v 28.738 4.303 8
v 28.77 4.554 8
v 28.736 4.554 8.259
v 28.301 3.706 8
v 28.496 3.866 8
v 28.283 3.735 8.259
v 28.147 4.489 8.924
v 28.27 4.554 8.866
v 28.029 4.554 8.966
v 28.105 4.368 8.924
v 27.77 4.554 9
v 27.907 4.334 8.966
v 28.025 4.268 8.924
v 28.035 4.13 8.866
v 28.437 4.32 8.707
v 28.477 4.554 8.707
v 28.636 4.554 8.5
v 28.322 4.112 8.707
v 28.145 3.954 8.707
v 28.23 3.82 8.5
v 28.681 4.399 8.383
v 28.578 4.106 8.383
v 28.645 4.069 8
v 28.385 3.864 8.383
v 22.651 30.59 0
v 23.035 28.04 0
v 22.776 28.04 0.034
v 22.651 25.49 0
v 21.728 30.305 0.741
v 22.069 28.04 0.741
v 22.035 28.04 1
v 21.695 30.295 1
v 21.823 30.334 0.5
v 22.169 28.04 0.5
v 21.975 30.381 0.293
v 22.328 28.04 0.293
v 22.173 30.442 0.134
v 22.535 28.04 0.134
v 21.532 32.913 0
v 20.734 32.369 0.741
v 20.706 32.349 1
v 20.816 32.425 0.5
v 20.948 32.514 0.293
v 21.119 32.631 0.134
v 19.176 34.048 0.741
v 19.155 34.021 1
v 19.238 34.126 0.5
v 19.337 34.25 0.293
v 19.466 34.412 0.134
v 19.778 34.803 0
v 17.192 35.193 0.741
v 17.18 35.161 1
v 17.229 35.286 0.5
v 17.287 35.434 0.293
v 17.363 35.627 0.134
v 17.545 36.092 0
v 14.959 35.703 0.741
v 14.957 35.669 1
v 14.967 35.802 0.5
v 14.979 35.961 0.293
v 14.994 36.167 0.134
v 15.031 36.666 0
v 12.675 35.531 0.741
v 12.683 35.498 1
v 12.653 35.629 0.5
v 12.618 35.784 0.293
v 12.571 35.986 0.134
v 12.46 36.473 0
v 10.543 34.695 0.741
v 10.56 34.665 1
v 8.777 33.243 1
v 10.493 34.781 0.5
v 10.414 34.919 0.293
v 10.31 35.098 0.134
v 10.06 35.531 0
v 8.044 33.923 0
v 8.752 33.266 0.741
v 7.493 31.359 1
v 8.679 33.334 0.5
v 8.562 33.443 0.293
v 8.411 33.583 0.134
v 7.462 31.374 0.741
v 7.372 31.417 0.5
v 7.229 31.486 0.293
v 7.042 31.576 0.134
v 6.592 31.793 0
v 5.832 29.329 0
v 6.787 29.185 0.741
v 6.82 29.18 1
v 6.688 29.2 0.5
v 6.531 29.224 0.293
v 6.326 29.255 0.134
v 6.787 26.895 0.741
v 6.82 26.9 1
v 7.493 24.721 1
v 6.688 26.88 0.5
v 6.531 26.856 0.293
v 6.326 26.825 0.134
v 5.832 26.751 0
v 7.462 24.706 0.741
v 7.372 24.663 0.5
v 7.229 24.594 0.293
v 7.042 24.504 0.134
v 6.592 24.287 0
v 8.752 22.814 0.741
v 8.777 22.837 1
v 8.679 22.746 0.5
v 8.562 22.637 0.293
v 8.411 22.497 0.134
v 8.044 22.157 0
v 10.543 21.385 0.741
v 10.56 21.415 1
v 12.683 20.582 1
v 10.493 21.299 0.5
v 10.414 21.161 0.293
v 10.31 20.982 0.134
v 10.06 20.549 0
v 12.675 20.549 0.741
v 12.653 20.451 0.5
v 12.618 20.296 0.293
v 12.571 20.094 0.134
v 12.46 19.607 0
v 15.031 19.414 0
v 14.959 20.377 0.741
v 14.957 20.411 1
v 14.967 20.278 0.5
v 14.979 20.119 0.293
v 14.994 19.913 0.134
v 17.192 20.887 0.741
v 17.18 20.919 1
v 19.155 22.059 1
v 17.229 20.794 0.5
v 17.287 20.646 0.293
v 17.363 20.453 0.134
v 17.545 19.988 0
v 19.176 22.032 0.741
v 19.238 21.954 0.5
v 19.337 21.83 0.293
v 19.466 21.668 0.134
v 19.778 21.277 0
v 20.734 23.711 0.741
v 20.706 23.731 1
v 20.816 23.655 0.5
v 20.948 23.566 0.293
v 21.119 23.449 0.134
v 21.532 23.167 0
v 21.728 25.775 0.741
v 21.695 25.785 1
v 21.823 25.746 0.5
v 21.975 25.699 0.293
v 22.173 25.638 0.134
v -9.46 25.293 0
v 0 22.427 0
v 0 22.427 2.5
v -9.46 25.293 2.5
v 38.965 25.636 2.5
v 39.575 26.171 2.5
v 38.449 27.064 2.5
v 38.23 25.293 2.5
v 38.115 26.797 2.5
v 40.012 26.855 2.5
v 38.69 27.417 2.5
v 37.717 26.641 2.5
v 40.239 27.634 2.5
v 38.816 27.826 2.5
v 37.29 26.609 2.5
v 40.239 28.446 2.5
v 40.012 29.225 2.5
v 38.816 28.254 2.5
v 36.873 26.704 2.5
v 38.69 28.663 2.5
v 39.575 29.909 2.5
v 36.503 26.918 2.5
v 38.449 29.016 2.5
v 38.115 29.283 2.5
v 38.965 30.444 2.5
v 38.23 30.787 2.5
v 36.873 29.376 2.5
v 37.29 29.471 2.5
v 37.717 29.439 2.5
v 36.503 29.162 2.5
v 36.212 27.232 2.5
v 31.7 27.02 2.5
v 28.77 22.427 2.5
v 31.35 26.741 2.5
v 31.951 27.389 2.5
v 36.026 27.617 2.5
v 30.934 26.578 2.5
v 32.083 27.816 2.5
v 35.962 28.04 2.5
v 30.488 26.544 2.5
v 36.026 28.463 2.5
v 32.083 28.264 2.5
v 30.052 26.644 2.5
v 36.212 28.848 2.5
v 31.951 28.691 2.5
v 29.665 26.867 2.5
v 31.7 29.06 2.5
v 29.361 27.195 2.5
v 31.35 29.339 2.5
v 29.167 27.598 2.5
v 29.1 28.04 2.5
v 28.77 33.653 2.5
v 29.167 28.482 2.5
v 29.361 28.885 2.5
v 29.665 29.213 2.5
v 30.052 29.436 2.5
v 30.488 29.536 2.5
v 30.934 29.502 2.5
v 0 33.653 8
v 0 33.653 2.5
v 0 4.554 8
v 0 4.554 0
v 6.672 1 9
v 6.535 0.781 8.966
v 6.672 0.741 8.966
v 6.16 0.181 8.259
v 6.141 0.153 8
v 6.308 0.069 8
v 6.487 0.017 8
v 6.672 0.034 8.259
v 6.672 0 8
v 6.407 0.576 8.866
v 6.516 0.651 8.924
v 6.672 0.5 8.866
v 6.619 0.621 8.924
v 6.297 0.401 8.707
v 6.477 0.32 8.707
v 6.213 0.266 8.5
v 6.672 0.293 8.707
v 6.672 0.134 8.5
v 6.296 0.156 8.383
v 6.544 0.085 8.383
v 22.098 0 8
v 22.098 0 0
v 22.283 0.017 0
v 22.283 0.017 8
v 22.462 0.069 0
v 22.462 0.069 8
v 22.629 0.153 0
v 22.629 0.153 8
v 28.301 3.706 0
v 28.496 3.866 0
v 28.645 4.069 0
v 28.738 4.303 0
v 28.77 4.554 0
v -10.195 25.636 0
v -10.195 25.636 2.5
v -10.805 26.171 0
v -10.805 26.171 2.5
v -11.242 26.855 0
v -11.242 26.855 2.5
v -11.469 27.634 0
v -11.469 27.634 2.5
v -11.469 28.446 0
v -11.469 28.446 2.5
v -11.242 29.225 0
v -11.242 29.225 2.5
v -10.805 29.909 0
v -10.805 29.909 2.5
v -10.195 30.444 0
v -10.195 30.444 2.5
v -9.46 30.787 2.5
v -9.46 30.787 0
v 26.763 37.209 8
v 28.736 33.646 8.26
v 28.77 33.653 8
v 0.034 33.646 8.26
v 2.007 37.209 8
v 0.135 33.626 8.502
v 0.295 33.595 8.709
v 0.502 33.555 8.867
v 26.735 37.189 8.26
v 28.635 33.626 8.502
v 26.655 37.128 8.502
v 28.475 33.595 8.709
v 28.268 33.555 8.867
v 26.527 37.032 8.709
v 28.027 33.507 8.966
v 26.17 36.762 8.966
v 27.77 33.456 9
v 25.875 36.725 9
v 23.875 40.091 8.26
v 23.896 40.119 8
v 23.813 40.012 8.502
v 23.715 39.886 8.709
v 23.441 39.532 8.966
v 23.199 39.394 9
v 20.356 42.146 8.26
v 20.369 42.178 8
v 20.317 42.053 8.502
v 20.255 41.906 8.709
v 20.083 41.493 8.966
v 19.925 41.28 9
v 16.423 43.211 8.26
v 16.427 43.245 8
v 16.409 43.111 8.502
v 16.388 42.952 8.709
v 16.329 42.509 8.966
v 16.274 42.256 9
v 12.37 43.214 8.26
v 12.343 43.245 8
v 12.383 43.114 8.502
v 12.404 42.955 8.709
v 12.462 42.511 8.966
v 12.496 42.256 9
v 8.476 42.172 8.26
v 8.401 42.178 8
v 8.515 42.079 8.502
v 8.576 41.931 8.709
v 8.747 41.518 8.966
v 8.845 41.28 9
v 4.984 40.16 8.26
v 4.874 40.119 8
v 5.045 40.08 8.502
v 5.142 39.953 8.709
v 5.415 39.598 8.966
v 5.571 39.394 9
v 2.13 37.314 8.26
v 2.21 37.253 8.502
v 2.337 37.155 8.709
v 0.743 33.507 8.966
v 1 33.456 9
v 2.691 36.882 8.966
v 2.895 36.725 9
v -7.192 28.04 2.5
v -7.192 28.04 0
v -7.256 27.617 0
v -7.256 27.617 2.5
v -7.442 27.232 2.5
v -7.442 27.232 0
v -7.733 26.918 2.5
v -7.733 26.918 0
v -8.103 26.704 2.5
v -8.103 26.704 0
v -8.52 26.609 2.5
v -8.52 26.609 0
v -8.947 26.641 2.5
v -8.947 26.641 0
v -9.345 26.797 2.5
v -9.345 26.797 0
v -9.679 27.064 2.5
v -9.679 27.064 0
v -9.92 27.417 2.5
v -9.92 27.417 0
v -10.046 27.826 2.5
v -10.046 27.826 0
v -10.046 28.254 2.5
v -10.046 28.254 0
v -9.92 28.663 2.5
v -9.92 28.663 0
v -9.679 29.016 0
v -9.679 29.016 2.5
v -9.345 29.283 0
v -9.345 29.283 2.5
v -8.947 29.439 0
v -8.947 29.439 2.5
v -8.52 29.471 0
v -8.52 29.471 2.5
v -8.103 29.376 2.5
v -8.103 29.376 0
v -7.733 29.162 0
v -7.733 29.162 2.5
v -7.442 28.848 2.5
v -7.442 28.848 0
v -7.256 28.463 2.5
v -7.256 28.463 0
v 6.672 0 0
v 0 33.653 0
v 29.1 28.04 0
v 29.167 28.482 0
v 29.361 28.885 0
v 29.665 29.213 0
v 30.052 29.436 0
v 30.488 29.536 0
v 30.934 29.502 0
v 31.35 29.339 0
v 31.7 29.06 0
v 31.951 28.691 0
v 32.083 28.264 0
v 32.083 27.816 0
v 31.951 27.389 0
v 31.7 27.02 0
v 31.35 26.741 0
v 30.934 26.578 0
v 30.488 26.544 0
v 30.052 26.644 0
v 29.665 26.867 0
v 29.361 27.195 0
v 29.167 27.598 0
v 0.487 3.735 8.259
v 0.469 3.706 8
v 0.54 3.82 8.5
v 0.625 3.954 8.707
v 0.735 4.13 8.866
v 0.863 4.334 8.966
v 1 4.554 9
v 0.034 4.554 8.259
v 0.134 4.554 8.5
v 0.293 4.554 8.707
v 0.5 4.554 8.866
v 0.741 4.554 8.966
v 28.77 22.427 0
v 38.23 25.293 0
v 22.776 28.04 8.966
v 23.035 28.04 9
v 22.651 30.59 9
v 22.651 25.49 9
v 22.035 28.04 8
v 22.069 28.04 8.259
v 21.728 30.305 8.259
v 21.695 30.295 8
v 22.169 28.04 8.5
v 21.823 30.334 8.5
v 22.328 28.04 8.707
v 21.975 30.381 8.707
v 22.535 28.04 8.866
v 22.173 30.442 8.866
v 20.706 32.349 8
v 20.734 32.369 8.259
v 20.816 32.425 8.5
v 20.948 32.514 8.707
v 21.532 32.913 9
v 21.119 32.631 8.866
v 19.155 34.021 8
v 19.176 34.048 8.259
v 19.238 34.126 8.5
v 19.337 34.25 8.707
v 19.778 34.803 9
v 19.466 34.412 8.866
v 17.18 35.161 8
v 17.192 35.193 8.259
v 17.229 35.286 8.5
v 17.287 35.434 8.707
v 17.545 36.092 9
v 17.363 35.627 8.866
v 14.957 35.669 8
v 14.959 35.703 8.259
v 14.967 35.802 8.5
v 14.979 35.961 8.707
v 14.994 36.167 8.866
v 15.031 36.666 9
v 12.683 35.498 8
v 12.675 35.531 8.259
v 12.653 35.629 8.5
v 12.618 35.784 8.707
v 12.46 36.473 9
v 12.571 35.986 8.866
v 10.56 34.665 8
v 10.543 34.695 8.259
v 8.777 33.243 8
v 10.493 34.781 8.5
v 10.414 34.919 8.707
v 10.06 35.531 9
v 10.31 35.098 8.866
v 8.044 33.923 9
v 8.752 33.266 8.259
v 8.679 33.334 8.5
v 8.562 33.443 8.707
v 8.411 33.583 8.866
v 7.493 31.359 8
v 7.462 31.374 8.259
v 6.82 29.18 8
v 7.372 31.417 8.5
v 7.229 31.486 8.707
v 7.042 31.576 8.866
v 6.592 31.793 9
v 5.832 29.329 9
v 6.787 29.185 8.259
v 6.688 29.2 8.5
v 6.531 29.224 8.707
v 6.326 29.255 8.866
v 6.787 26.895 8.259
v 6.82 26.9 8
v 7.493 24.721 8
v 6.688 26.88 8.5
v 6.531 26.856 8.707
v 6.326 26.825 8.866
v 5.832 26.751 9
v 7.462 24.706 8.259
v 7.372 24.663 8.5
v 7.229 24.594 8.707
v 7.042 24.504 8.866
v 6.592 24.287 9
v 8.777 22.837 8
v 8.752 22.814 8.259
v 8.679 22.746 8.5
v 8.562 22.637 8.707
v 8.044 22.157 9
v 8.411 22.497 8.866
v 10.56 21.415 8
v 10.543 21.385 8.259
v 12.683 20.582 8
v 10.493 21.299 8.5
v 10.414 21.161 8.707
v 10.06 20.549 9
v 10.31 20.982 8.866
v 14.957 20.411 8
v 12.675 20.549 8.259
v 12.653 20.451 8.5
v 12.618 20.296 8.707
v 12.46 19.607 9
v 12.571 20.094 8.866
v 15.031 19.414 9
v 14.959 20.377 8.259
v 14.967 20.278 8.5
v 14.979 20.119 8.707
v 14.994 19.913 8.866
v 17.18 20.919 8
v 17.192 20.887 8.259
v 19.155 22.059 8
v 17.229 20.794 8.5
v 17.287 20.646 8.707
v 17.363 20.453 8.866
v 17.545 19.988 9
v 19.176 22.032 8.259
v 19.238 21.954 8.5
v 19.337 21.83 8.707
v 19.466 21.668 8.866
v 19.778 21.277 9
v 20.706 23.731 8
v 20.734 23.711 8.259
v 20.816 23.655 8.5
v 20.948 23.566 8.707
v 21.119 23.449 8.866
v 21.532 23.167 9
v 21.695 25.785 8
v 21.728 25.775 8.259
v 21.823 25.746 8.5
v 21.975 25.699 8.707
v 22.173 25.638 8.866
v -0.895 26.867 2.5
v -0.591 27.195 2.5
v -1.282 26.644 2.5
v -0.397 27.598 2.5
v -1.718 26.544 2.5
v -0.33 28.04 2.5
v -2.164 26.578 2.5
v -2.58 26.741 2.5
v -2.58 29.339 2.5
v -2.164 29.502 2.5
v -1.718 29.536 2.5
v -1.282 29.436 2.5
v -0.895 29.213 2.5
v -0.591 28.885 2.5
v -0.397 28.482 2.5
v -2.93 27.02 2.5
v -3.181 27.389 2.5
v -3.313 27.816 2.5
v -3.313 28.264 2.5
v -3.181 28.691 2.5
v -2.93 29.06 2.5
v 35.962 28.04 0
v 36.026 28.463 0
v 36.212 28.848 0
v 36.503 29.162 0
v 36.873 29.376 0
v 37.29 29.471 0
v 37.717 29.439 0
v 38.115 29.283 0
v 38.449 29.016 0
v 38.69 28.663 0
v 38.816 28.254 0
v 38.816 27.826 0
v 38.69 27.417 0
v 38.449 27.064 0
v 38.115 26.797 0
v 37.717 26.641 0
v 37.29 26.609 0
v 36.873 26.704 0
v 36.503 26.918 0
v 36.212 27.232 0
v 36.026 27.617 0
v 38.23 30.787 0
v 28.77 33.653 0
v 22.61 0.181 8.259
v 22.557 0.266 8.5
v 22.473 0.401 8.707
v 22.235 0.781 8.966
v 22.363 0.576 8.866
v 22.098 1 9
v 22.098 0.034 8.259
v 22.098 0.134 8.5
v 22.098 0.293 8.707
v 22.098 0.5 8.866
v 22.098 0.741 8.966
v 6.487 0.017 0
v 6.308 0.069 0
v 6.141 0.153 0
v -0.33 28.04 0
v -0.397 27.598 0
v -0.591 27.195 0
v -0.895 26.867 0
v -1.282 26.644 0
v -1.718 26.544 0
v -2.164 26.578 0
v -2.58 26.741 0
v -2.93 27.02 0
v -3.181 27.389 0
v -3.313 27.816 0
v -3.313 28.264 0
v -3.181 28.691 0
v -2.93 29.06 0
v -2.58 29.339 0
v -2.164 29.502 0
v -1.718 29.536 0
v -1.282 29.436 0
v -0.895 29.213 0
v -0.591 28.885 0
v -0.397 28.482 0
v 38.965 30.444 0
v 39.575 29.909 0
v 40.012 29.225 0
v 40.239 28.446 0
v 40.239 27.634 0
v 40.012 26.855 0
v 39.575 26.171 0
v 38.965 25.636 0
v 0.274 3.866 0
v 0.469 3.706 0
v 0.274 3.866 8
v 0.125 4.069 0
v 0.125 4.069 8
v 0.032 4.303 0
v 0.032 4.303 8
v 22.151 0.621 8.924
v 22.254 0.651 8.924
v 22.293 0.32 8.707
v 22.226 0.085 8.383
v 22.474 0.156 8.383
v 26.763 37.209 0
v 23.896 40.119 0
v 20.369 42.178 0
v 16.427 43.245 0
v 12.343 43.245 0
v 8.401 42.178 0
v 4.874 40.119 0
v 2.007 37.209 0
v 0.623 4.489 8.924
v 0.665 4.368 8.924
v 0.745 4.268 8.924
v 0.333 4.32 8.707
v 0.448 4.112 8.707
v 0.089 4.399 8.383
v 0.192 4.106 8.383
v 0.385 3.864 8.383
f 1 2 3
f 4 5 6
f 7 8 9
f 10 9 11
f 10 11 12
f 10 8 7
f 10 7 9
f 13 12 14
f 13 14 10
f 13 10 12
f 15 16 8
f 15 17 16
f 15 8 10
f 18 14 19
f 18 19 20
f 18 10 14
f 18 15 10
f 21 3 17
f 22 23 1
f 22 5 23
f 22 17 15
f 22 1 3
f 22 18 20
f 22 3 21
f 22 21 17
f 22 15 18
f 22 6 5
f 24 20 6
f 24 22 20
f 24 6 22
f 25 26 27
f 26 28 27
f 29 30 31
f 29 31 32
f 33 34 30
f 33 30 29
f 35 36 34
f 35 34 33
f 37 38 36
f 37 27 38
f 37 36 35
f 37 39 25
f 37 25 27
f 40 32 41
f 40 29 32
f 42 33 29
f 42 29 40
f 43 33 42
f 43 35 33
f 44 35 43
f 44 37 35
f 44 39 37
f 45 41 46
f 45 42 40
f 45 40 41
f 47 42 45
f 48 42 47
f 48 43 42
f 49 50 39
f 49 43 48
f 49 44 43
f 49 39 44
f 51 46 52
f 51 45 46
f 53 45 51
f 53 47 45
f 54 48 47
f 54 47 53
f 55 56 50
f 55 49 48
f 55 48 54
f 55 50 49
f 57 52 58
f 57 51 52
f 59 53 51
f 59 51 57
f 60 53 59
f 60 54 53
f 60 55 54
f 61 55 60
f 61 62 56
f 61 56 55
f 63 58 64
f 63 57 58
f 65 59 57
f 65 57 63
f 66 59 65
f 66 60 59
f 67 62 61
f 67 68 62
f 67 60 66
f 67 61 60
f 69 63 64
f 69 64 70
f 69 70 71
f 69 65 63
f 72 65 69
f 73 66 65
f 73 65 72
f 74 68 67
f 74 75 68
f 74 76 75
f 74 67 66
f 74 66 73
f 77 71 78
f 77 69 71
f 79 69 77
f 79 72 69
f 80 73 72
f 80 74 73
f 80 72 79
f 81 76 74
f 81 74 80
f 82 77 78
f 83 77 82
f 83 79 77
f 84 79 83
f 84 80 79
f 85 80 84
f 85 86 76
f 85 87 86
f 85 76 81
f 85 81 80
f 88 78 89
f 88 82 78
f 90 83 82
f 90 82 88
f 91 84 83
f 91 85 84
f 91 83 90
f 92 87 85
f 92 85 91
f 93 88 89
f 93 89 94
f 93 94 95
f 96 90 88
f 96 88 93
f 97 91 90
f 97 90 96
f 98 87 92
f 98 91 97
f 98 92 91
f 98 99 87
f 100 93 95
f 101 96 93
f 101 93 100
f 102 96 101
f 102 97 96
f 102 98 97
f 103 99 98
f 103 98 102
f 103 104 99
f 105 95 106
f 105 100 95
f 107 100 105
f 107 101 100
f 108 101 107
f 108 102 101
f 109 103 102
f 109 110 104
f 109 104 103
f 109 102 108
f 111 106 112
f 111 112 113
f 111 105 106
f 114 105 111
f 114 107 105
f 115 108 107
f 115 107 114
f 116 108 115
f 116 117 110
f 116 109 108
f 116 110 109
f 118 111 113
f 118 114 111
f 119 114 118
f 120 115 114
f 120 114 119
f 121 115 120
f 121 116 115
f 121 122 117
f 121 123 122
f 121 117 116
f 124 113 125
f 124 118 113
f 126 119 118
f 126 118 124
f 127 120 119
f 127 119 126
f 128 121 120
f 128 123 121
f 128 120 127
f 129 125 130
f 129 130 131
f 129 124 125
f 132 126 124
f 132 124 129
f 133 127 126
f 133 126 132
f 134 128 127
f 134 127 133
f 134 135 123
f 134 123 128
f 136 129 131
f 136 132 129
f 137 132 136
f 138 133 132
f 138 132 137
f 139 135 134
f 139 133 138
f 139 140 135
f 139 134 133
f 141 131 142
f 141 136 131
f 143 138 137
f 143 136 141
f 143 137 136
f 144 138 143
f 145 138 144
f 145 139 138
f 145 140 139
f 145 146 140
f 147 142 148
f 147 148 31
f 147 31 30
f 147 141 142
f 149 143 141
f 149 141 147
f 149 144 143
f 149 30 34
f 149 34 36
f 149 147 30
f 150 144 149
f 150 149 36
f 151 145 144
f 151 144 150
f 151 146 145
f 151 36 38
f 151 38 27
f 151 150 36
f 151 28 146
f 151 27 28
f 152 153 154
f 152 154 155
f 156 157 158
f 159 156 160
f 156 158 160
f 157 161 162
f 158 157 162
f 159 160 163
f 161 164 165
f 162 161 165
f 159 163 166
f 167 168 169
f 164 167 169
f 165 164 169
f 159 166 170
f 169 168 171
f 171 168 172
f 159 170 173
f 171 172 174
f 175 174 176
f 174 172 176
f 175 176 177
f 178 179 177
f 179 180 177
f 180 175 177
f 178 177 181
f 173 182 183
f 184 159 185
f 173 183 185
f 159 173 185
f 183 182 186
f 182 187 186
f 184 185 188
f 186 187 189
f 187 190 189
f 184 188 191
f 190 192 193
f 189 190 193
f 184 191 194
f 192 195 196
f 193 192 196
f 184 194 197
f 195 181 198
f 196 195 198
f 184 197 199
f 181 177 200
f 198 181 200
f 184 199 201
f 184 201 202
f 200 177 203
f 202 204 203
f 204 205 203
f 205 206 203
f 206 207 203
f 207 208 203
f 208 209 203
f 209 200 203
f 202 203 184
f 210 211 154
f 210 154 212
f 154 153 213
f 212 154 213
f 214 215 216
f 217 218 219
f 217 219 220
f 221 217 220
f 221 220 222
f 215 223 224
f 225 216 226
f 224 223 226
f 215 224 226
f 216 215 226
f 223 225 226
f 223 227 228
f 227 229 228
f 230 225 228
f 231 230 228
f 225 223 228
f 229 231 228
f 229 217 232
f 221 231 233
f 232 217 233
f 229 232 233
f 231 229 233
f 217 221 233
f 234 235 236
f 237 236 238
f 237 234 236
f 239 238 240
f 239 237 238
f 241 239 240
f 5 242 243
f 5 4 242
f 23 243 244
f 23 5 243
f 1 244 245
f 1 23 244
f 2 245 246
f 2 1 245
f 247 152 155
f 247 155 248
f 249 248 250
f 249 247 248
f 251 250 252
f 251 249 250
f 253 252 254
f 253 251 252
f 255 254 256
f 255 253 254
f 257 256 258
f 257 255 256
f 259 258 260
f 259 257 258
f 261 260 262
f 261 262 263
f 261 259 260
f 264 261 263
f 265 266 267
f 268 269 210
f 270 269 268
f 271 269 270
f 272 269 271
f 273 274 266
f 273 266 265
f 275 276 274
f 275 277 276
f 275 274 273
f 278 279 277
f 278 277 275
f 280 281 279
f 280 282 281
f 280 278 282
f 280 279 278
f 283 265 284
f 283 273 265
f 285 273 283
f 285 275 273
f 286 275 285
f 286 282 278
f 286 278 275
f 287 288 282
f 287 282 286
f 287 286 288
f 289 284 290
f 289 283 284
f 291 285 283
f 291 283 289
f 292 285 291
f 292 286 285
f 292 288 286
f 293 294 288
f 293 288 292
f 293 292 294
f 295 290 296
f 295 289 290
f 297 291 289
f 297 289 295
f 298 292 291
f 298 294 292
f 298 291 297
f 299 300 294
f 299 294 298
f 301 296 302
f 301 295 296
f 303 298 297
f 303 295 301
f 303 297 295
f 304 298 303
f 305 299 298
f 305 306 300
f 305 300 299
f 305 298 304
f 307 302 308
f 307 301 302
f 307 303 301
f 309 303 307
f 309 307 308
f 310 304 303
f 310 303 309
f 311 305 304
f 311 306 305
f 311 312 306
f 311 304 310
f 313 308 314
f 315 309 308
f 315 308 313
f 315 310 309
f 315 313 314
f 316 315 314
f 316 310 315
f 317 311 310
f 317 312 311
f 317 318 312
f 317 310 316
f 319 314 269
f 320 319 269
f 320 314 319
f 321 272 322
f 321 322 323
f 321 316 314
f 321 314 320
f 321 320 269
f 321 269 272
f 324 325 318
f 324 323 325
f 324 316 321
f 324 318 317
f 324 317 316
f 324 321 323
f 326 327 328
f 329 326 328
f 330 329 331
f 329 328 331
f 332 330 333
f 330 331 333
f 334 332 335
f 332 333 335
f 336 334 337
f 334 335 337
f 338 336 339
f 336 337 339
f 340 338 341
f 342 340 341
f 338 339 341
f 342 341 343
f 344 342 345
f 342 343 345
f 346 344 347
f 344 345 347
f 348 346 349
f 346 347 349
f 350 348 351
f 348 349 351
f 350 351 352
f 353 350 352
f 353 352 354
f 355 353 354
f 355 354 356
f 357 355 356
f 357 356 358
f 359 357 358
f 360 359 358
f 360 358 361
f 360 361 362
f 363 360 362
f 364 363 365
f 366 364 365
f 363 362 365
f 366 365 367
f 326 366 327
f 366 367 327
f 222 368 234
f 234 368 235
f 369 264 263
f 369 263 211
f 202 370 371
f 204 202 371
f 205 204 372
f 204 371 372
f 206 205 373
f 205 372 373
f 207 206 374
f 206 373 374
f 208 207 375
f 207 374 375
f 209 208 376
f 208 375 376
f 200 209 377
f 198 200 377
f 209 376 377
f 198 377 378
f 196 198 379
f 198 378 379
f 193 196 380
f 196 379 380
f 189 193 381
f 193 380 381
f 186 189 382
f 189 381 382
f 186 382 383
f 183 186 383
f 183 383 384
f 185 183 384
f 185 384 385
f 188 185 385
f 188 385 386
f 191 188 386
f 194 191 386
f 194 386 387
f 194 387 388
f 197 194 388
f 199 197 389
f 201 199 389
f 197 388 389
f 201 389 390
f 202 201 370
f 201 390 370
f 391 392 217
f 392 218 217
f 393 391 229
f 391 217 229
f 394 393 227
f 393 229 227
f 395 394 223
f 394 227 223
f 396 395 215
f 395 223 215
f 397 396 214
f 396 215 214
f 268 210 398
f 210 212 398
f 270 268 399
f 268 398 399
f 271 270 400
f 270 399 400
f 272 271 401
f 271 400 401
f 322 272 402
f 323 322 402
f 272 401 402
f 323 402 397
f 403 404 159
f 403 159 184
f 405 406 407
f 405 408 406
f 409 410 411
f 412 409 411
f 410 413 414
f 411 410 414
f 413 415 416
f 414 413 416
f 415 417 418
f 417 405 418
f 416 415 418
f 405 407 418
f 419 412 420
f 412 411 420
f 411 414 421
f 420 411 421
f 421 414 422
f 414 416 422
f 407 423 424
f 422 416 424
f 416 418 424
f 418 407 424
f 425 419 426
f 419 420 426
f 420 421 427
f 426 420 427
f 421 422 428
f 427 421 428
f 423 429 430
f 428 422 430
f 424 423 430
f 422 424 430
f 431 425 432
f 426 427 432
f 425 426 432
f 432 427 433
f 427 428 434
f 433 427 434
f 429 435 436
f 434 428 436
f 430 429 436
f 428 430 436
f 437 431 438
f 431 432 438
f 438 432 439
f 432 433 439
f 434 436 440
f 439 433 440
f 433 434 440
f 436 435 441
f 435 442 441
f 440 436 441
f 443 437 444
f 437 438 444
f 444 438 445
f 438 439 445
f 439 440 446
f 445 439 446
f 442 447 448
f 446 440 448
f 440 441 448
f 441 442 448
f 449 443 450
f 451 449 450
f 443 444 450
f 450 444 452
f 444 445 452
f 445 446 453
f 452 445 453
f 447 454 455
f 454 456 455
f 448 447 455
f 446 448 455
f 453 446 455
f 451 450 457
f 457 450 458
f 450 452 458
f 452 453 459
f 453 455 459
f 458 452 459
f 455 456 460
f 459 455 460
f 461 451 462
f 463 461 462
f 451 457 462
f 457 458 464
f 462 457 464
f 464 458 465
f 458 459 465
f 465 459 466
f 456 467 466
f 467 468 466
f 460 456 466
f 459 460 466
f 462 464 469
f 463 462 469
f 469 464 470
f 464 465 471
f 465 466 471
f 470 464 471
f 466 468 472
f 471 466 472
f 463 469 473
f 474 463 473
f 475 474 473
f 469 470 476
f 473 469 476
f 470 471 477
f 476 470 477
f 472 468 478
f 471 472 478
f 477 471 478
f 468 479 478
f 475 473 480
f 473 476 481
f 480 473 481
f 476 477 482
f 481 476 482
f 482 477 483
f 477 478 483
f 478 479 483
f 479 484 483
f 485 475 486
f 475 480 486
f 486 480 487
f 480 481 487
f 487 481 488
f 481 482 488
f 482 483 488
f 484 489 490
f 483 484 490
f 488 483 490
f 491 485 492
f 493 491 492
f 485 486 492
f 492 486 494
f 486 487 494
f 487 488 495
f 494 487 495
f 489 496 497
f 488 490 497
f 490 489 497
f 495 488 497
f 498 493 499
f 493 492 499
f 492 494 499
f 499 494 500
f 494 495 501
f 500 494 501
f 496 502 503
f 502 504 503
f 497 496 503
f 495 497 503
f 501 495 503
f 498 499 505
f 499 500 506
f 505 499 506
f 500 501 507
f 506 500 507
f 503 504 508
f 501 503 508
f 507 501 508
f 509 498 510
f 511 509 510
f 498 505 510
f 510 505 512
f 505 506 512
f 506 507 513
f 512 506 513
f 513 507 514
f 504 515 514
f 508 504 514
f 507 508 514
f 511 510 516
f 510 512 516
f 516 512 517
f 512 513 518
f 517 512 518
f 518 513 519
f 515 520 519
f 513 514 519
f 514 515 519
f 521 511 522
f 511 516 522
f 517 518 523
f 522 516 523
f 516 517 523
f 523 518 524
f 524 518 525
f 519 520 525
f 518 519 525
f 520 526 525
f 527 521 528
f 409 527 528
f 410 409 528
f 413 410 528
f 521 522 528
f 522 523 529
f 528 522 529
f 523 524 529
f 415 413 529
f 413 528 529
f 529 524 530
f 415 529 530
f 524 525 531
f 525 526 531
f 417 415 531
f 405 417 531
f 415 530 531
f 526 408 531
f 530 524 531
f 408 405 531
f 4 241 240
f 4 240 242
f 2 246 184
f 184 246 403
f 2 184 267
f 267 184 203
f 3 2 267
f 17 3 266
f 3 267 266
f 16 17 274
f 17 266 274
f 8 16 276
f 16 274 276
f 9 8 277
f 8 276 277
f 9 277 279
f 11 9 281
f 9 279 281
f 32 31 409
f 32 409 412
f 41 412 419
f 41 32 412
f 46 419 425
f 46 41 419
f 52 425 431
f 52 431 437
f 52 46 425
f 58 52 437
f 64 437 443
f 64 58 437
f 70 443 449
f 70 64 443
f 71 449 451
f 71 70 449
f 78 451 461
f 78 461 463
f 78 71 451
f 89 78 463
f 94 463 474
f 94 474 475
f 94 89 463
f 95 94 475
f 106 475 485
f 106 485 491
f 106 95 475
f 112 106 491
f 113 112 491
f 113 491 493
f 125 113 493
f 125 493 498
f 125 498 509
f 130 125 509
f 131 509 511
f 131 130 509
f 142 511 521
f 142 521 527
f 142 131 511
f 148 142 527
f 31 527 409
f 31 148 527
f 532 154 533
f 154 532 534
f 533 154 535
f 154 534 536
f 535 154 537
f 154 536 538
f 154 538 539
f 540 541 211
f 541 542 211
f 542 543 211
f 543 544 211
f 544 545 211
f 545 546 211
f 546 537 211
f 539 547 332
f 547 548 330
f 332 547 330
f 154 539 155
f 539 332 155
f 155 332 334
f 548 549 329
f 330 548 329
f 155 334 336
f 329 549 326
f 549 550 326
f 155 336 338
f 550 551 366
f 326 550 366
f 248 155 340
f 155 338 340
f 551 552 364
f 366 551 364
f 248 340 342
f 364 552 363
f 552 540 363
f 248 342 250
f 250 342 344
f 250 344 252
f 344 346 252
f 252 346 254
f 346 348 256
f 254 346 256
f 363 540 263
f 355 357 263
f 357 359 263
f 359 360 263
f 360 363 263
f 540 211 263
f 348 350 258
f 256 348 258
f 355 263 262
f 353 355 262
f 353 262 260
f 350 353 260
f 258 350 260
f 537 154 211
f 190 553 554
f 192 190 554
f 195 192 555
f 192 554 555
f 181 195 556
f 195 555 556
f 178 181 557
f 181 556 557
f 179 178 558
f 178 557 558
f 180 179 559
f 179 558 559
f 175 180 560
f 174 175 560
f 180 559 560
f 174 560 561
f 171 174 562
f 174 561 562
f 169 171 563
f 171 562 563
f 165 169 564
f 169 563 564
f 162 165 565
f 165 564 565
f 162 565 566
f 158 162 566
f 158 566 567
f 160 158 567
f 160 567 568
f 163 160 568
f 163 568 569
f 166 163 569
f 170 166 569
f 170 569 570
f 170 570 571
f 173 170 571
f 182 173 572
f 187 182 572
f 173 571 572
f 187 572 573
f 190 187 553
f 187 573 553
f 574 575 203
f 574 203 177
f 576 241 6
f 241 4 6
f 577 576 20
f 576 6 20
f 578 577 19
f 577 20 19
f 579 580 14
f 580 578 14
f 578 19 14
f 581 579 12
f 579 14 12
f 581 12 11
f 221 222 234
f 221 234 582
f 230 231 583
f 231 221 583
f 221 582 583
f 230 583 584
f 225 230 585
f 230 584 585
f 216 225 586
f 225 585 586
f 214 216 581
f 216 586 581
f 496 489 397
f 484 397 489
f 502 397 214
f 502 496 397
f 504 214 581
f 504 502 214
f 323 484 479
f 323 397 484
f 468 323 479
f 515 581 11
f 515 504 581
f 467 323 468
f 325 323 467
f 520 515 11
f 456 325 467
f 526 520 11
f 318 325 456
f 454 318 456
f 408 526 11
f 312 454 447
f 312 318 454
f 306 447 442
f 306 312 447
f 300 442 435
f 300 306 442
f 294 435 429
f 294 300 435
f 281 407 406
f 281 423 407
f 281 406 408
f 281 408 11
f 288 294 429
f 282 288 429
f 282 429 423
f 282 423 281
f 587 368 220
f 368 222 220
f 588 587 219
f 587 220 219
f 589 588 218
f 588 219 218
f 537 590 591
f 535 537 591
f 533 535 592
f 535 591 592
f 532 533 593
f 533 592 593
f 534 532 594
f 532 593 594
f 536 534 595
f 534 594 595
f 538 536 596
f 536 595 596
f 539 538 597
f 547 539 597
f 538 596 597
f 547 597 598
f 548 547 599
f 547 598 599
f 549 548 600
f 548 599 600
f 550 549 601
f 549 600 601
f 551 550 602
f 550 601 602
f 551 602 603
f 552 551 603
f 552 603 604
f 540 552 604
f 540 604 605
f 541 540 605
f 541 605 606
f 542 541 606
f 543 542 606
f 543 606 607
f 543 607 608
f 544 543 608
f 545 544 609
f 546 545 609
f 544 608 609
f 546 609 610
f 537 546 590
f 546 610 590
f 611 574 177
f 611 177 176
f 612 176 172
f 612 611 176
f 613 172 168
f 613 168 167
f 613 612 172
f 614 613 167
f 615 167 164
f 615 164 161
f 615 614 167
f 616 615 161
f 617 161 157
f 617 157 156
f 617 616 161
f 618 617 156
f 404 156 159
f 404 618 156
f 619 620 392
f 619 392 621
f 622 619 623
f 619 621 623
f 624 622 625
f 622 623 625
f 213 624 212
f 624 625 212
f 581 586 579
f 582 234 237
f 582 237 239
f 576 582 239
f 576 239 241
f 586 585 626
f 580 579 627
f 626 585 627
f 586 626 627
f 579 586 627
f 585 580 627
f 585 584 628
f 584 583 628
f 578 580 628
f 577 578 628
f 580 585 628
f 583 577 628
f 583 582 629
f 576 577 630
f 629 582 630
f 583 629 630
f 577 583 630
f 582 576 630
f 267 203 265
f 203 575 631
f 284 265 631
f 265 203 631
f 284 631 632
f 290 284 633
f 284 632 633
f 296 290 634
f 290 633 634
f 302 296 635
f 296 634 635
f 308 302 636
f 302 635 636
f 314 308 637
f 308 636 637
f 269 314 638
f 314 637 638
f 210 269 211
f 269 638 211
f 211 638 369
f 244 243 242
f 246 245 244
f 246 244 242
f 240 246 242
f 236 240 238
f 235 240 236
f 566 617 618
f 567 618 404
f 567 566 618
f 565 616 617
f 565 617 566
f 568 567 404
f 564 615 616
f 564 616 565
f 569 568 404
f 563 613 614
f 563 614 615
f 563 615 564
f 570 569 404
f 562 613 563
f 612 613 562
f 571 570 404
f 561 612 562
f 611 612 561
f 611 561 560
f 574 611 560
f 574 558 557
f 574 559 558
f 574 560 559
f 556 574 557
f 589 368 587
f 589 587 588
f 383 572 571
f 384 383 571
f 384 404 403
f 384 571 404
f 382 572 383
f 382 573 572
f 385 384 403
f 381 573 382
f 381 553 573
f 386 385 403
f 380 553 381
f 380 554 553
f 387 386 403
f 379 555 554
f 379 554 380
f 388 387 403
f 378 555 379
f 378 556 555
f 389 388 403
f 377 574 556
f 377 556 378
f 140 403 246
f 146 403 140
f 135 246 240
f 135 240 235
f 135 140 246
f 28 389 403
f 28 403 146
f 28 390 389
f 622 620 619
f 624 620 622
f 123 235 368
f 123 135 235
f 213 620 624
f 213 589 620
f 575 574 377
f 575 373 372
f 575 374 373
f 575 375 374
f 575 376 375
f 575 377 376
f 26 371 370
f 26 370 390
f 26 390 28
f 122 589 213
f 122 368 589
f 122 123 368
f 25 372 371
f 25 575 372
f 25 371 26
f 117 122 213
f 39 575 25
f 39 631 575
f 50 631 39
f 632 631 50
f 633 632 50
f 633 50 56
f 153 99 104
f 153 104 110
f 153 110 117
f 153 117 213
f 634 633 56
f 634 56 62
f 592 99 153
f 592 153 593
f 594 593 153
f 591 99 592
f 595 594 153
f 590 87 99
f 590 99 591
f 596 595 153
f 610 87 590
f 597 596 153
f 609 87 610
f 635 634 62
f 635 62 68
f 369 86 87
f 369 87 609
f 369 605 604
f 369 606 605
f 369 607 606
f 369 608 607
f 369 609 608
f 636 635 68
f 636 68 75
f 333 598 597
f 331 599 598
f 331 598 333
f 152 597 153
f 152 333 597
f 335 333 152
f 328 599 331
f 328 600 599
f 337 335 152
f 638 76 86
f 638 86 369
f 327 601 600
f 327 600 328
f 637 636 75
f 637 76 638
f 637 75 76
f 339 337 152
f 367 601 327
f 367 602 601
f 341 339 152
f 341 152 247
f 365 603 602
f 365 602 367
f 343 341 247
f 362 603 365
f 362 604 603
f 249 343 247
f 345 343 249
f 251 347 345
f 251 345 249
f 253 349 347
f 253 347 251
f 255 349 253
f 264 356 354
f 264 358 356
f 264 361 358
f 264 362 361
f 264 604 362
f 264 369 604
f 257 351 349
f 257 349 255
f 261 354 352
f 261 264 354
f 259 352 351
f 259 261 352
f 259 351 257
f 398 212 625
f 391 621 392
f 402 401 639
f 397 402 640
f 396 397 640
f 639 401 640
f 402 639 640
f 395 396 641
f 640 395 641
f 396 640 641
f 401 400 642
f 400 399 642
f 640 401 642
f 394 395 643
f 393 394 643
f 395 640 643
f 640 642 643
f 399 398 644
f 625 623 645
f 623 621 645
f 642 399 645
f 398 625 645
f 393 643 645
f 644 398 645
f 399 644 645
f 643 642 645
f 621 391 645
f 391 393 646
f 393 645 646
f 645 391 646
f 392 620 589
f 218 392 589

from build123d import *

# Parameters (mm, degrees)
SKETCH1_R           = 7.65
BOSS_EXTRUDE1_DEPTH = 9
FILLET1_R           = 1
SKETCH2_R           = 1.5
SKETCH2_R_2         = 1.435
BOSS_EXTRUDE2_DEPTH = 2.5


with BuildPart() as part:
    # Sketch1 → Boss-Extrude1 (new body)
    with BuildSketch(Plane.XY):
        with BuildLine():
            Line((6.385, 0), (22.385, 0))
            Line((22.385, 0), (28.77, 4))
            Line((28.77, 4), (28.77, 33.652501624))
            ThreePointArc((28.77, 33.652501624), (14.385, 43.38), (0, 33.652501624))
            Line((0, 33.652501624), (0, 4))
            Line((0, 4), (6.385, 0))
        make_face()
        with Locations((14.385, 28.04)):
            Circle(SKETCH1_R, mode=Mode.SUBTRACT)
    extrude(amount=BOSS_EXTRUDE1_DEPTH)

    # Fillet1
    fillet1_edges = [part.edges().sort_by_distance(p)[0] for p in [
        (25.5775, 2, 9),
        (0, 4, 4.5),
        (28.77, 4, 4.5),
        (22.385, 0, 4.5),
        (6.385, 0, 4.5),
        (28.77, 18.826250812, 9),
        (14.385, 43.38, 9),
        (6.735, 28.04, 0),
        (6.735, 28.04, 9),
        (0, 18.826250812, 9),
        (3.1925, 2, 9),
        (14.385, 0, 9),
    ]]
    fillet(fillet1_edges, radius=FILLET1_R)

    # Sketch2 → Boss-Extrude2 (add)
    # profile 1 of 2: a face of its own
    with BuildSketch(Plane(origin=(0, 0, 0), x_dir=(-1, 0, 0), z_dir=(0, 0, -1))):
        with BuildLine():
            Line((-28.77, 33.652501624), (-38.229616207, 30.786722159))
            ThreePointArc((-38.229616207, 30.786722159), (-40.2675, 28.04), (-38.229616207, 25.293277841))
            Line((-38.229616207, 25.293277841), (-28.77, 22.427498376))
            Line((-28.77, 22.427498376), (-28.77, 33.652501624))
        make_face()
        with Locations((-30.6, 28.04)):
            Circle(SKETCH2_R, mode=Mode.SUBTRACT)
        with Locations((-37.3975, 28.04)):
            Circle(SKETCH2_R_2, mode=Mode.SUBTRACT)
    # profile 2 of 2: a face of its own
    with BuildSketch(Plane(origin=(0, 0, 0), x_dir=(-1, 0, 0), z_dir=(0, 0, -1))):
        with BuildLine():
            Line((0, 22.427498376), (9.459616207, 25.293277841))
            ThreePointArc((9.459616207, 25.293277841), (11.4975, 28.04), (9.459616207, 30.786722159))
            Line((9.459616207, 30.786722159), (0, 33.652501624))
            Line((0, 33.652501624), (0, 22.427498376))
        make_face()
        with Locations(Location((8.6275, 28.04, 0), (0, 0, 180))):
            Circle(SKETCH2_R_2, mode=Mode.SUBTRACT)
        with Locations(Location((1.83, 28.04, 0), (0, 0, 180))):
            Circle(SKETCH2_R, mode=Mode.SUBTRACT)
    extrude(amount=-BOSS_EXTRUDE2_DEPTH)


solid = part.part
